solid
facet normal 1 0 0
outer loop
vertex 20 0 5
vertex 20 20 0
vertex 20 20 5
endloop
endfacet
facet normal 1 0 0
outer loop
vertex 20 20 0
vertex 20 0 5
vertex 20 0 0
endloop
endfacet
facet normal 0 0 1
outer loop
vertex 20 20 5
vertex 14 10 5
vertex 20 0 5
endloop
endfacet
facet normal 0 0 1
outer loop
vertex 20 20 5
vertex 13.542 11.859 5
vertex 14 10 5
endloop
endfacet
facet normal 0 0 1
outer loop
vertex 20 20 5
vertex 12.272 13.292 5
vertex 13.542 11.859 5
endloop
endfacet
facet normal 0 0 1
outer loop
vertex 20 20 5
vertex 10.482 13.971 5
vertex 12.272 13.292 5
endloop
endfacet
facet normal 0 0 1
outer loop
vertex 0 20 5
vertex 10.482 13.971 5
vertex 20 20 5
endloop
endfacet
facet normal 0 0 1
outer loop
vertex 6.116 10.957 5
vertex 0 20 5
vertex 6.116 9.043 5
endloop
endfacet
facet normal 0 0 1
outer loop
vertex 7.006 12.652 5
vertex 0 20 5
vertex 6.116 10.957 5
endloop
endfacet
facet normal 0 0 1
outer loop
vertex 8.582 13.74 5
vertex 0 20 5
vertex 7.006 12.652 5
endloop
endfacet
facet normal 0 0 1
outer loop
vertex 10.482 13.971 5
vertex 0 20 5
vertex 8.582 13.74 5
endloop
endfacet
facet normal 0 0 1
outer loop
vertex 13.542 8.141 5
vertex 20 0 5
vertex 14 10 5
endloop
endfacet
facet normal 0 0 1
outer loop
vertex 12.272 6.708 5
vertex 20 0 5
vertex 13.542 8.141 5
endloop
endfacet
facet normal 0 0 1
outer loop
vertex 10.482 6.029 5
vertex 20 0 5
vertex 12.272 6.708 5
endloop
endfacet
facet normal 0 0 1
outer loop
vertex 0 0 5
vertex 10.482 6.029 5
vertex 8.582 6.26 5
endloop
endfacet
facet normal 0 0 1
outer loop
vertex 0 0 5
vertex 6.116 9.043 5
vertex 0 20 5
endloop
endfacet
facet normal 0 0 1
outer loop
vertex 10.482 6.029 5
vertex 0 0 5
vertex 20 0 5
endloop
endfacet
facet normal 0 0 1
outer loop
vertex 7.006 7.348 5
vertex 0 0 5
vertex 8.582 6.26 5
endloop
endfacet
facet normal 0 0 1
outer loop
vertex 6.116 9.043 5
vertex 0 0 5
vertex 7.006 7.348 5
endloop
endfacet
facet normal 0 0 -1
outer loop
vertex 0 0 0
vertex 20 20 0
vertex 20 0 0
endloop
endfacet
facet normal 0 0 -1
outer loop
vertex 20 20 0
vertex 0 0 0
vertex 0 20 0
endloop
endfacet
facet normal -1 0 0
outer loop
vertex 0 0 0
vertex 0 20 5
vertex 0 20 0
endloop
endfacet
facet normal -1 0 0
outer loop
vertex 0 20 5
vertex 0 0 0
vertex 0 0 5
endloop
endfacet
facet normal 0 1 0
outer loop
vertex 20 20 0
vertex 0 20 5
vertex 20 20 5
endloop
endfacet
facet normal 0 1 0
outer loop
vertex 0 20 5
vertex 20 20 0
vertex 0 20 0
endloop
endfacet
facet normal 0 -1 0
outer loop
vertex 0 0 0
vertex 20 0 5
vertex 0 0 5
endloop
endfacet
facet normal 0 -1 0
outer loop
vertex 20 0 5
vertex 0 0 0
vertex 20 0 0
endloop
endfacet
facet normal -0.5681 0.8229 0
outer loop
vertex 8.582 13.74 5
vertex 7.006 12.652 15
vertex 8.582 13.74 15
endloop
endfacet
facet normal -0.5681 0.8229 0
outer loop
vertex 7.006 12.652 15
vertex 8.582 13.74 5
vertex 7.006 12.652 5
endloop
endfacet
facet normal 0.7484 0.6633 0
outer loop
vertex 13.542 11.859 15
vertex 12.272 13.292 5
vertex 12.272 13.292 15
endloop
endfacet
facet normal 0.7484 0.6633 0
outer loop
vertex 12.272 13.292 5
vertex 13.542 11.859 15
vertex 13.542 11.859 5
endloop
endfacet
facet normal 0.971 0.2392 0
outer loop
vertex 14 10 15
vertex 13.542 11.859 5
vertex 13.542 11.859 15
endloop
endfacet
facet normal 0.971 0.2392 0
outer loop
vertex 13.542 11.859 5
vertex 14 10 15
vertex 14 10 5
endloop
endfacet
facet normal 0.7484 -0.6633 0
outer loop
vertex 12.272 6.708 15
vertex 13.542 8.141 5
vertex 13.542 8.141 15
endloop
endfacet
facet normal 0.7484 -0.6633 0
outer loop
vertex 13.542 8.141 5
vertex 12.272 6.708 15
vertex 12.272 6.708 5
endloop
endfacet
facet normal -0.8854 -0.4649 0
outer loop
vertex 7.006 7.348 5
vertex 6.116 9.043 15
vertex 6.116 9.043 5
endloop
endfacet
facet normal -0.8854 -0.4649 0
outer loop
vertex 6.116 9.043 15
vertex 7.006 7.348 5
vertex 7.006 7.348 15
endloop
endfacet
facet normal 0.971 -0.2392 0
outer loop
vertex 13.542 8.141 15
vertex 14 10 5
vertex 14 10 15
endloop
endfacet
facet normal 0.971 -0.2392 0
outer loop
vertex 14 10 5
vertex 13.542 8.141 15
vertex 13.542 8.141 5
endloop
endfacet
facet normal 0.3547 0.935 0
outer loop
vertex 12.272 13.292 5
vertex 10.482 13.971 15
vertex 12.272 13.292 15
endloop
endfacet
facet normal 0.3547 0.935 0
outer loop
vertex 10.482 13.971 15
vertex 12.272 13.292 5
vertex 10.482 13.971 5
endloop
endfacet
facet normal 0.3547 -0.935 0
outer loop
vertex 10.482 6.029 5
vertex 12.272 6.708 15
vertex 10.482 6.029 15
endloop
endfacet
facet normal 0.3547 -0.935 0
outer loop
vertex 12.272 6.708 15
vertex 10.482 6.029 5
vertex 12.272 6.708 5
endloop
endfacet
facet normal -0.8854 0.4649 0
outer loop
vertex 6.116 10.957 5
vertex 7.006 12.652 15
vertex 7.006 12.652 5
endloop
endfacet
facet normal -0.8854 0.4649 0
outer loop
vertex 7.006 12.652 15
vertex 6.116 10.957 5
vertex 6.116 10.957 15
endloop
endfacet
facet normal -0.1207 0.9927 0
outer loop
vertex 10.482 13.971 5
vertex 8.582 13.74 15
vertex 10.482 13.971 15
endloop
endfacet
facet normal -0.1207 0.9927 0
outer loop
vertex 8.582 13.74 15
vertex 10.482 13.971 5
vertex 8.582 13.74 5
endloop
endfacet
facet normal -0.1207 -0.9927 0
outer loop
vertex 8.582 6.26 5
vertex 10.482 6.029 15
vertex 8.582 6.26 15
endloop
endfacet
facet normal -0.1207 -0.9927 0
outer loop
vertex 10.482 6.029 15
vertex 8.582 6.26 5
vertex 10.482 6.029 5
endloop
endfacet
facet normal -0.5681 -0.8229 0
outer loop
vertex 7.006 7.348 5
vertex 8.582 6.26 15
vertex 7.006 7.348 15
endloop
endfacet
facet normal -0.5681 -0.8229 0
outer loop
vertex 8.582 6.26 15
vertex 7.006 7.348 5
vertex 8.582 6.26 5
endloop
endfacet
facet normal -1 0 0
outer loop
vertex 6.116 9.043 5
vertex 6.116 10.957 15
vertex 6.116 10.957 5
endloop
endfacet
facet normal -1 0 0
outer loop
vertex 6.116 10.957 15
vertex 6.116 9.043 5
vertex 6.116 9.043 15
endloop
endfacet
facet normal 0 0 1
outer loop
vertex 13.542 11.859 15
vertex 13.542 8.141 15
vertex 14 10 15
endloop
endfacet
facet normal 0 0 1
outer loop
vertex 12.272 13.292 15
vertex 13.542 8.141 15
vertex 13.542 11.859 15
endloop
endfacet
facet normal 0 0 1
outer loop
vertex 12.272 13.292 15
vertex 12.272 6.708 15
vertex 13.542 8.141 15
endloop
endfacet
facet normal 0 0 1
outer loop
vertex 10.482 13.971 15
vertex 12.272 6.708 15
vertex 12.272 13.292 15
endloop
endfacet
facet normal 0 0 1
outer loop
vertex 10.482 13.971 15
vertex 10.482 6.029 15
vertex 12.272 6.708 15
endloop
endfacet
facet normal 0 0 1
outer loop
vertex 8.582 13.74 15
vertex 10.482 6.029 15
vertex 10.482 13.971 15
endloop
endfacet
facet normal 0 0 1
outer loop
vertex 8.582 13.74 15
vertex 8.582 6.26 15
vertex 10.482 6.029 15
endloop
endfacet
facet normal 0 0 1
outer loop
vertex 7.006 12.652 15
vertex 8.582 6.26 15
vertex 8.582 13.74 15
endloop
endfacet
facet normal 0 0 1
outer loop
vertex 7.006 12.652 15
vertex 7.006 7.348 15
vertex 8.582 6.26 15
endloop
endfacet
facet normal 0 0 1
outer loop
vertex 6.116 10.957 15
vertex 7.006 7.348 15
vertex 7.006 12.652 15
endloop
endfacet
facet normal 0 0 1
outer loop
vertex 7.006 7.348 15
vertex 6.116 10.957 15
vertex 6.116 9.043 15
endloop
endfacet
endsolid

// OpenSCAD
union(fillet = 2) { cube([20,20,5]); color("blue") translate([10,10,0]) cylinder(h = 15, r = 4); }
